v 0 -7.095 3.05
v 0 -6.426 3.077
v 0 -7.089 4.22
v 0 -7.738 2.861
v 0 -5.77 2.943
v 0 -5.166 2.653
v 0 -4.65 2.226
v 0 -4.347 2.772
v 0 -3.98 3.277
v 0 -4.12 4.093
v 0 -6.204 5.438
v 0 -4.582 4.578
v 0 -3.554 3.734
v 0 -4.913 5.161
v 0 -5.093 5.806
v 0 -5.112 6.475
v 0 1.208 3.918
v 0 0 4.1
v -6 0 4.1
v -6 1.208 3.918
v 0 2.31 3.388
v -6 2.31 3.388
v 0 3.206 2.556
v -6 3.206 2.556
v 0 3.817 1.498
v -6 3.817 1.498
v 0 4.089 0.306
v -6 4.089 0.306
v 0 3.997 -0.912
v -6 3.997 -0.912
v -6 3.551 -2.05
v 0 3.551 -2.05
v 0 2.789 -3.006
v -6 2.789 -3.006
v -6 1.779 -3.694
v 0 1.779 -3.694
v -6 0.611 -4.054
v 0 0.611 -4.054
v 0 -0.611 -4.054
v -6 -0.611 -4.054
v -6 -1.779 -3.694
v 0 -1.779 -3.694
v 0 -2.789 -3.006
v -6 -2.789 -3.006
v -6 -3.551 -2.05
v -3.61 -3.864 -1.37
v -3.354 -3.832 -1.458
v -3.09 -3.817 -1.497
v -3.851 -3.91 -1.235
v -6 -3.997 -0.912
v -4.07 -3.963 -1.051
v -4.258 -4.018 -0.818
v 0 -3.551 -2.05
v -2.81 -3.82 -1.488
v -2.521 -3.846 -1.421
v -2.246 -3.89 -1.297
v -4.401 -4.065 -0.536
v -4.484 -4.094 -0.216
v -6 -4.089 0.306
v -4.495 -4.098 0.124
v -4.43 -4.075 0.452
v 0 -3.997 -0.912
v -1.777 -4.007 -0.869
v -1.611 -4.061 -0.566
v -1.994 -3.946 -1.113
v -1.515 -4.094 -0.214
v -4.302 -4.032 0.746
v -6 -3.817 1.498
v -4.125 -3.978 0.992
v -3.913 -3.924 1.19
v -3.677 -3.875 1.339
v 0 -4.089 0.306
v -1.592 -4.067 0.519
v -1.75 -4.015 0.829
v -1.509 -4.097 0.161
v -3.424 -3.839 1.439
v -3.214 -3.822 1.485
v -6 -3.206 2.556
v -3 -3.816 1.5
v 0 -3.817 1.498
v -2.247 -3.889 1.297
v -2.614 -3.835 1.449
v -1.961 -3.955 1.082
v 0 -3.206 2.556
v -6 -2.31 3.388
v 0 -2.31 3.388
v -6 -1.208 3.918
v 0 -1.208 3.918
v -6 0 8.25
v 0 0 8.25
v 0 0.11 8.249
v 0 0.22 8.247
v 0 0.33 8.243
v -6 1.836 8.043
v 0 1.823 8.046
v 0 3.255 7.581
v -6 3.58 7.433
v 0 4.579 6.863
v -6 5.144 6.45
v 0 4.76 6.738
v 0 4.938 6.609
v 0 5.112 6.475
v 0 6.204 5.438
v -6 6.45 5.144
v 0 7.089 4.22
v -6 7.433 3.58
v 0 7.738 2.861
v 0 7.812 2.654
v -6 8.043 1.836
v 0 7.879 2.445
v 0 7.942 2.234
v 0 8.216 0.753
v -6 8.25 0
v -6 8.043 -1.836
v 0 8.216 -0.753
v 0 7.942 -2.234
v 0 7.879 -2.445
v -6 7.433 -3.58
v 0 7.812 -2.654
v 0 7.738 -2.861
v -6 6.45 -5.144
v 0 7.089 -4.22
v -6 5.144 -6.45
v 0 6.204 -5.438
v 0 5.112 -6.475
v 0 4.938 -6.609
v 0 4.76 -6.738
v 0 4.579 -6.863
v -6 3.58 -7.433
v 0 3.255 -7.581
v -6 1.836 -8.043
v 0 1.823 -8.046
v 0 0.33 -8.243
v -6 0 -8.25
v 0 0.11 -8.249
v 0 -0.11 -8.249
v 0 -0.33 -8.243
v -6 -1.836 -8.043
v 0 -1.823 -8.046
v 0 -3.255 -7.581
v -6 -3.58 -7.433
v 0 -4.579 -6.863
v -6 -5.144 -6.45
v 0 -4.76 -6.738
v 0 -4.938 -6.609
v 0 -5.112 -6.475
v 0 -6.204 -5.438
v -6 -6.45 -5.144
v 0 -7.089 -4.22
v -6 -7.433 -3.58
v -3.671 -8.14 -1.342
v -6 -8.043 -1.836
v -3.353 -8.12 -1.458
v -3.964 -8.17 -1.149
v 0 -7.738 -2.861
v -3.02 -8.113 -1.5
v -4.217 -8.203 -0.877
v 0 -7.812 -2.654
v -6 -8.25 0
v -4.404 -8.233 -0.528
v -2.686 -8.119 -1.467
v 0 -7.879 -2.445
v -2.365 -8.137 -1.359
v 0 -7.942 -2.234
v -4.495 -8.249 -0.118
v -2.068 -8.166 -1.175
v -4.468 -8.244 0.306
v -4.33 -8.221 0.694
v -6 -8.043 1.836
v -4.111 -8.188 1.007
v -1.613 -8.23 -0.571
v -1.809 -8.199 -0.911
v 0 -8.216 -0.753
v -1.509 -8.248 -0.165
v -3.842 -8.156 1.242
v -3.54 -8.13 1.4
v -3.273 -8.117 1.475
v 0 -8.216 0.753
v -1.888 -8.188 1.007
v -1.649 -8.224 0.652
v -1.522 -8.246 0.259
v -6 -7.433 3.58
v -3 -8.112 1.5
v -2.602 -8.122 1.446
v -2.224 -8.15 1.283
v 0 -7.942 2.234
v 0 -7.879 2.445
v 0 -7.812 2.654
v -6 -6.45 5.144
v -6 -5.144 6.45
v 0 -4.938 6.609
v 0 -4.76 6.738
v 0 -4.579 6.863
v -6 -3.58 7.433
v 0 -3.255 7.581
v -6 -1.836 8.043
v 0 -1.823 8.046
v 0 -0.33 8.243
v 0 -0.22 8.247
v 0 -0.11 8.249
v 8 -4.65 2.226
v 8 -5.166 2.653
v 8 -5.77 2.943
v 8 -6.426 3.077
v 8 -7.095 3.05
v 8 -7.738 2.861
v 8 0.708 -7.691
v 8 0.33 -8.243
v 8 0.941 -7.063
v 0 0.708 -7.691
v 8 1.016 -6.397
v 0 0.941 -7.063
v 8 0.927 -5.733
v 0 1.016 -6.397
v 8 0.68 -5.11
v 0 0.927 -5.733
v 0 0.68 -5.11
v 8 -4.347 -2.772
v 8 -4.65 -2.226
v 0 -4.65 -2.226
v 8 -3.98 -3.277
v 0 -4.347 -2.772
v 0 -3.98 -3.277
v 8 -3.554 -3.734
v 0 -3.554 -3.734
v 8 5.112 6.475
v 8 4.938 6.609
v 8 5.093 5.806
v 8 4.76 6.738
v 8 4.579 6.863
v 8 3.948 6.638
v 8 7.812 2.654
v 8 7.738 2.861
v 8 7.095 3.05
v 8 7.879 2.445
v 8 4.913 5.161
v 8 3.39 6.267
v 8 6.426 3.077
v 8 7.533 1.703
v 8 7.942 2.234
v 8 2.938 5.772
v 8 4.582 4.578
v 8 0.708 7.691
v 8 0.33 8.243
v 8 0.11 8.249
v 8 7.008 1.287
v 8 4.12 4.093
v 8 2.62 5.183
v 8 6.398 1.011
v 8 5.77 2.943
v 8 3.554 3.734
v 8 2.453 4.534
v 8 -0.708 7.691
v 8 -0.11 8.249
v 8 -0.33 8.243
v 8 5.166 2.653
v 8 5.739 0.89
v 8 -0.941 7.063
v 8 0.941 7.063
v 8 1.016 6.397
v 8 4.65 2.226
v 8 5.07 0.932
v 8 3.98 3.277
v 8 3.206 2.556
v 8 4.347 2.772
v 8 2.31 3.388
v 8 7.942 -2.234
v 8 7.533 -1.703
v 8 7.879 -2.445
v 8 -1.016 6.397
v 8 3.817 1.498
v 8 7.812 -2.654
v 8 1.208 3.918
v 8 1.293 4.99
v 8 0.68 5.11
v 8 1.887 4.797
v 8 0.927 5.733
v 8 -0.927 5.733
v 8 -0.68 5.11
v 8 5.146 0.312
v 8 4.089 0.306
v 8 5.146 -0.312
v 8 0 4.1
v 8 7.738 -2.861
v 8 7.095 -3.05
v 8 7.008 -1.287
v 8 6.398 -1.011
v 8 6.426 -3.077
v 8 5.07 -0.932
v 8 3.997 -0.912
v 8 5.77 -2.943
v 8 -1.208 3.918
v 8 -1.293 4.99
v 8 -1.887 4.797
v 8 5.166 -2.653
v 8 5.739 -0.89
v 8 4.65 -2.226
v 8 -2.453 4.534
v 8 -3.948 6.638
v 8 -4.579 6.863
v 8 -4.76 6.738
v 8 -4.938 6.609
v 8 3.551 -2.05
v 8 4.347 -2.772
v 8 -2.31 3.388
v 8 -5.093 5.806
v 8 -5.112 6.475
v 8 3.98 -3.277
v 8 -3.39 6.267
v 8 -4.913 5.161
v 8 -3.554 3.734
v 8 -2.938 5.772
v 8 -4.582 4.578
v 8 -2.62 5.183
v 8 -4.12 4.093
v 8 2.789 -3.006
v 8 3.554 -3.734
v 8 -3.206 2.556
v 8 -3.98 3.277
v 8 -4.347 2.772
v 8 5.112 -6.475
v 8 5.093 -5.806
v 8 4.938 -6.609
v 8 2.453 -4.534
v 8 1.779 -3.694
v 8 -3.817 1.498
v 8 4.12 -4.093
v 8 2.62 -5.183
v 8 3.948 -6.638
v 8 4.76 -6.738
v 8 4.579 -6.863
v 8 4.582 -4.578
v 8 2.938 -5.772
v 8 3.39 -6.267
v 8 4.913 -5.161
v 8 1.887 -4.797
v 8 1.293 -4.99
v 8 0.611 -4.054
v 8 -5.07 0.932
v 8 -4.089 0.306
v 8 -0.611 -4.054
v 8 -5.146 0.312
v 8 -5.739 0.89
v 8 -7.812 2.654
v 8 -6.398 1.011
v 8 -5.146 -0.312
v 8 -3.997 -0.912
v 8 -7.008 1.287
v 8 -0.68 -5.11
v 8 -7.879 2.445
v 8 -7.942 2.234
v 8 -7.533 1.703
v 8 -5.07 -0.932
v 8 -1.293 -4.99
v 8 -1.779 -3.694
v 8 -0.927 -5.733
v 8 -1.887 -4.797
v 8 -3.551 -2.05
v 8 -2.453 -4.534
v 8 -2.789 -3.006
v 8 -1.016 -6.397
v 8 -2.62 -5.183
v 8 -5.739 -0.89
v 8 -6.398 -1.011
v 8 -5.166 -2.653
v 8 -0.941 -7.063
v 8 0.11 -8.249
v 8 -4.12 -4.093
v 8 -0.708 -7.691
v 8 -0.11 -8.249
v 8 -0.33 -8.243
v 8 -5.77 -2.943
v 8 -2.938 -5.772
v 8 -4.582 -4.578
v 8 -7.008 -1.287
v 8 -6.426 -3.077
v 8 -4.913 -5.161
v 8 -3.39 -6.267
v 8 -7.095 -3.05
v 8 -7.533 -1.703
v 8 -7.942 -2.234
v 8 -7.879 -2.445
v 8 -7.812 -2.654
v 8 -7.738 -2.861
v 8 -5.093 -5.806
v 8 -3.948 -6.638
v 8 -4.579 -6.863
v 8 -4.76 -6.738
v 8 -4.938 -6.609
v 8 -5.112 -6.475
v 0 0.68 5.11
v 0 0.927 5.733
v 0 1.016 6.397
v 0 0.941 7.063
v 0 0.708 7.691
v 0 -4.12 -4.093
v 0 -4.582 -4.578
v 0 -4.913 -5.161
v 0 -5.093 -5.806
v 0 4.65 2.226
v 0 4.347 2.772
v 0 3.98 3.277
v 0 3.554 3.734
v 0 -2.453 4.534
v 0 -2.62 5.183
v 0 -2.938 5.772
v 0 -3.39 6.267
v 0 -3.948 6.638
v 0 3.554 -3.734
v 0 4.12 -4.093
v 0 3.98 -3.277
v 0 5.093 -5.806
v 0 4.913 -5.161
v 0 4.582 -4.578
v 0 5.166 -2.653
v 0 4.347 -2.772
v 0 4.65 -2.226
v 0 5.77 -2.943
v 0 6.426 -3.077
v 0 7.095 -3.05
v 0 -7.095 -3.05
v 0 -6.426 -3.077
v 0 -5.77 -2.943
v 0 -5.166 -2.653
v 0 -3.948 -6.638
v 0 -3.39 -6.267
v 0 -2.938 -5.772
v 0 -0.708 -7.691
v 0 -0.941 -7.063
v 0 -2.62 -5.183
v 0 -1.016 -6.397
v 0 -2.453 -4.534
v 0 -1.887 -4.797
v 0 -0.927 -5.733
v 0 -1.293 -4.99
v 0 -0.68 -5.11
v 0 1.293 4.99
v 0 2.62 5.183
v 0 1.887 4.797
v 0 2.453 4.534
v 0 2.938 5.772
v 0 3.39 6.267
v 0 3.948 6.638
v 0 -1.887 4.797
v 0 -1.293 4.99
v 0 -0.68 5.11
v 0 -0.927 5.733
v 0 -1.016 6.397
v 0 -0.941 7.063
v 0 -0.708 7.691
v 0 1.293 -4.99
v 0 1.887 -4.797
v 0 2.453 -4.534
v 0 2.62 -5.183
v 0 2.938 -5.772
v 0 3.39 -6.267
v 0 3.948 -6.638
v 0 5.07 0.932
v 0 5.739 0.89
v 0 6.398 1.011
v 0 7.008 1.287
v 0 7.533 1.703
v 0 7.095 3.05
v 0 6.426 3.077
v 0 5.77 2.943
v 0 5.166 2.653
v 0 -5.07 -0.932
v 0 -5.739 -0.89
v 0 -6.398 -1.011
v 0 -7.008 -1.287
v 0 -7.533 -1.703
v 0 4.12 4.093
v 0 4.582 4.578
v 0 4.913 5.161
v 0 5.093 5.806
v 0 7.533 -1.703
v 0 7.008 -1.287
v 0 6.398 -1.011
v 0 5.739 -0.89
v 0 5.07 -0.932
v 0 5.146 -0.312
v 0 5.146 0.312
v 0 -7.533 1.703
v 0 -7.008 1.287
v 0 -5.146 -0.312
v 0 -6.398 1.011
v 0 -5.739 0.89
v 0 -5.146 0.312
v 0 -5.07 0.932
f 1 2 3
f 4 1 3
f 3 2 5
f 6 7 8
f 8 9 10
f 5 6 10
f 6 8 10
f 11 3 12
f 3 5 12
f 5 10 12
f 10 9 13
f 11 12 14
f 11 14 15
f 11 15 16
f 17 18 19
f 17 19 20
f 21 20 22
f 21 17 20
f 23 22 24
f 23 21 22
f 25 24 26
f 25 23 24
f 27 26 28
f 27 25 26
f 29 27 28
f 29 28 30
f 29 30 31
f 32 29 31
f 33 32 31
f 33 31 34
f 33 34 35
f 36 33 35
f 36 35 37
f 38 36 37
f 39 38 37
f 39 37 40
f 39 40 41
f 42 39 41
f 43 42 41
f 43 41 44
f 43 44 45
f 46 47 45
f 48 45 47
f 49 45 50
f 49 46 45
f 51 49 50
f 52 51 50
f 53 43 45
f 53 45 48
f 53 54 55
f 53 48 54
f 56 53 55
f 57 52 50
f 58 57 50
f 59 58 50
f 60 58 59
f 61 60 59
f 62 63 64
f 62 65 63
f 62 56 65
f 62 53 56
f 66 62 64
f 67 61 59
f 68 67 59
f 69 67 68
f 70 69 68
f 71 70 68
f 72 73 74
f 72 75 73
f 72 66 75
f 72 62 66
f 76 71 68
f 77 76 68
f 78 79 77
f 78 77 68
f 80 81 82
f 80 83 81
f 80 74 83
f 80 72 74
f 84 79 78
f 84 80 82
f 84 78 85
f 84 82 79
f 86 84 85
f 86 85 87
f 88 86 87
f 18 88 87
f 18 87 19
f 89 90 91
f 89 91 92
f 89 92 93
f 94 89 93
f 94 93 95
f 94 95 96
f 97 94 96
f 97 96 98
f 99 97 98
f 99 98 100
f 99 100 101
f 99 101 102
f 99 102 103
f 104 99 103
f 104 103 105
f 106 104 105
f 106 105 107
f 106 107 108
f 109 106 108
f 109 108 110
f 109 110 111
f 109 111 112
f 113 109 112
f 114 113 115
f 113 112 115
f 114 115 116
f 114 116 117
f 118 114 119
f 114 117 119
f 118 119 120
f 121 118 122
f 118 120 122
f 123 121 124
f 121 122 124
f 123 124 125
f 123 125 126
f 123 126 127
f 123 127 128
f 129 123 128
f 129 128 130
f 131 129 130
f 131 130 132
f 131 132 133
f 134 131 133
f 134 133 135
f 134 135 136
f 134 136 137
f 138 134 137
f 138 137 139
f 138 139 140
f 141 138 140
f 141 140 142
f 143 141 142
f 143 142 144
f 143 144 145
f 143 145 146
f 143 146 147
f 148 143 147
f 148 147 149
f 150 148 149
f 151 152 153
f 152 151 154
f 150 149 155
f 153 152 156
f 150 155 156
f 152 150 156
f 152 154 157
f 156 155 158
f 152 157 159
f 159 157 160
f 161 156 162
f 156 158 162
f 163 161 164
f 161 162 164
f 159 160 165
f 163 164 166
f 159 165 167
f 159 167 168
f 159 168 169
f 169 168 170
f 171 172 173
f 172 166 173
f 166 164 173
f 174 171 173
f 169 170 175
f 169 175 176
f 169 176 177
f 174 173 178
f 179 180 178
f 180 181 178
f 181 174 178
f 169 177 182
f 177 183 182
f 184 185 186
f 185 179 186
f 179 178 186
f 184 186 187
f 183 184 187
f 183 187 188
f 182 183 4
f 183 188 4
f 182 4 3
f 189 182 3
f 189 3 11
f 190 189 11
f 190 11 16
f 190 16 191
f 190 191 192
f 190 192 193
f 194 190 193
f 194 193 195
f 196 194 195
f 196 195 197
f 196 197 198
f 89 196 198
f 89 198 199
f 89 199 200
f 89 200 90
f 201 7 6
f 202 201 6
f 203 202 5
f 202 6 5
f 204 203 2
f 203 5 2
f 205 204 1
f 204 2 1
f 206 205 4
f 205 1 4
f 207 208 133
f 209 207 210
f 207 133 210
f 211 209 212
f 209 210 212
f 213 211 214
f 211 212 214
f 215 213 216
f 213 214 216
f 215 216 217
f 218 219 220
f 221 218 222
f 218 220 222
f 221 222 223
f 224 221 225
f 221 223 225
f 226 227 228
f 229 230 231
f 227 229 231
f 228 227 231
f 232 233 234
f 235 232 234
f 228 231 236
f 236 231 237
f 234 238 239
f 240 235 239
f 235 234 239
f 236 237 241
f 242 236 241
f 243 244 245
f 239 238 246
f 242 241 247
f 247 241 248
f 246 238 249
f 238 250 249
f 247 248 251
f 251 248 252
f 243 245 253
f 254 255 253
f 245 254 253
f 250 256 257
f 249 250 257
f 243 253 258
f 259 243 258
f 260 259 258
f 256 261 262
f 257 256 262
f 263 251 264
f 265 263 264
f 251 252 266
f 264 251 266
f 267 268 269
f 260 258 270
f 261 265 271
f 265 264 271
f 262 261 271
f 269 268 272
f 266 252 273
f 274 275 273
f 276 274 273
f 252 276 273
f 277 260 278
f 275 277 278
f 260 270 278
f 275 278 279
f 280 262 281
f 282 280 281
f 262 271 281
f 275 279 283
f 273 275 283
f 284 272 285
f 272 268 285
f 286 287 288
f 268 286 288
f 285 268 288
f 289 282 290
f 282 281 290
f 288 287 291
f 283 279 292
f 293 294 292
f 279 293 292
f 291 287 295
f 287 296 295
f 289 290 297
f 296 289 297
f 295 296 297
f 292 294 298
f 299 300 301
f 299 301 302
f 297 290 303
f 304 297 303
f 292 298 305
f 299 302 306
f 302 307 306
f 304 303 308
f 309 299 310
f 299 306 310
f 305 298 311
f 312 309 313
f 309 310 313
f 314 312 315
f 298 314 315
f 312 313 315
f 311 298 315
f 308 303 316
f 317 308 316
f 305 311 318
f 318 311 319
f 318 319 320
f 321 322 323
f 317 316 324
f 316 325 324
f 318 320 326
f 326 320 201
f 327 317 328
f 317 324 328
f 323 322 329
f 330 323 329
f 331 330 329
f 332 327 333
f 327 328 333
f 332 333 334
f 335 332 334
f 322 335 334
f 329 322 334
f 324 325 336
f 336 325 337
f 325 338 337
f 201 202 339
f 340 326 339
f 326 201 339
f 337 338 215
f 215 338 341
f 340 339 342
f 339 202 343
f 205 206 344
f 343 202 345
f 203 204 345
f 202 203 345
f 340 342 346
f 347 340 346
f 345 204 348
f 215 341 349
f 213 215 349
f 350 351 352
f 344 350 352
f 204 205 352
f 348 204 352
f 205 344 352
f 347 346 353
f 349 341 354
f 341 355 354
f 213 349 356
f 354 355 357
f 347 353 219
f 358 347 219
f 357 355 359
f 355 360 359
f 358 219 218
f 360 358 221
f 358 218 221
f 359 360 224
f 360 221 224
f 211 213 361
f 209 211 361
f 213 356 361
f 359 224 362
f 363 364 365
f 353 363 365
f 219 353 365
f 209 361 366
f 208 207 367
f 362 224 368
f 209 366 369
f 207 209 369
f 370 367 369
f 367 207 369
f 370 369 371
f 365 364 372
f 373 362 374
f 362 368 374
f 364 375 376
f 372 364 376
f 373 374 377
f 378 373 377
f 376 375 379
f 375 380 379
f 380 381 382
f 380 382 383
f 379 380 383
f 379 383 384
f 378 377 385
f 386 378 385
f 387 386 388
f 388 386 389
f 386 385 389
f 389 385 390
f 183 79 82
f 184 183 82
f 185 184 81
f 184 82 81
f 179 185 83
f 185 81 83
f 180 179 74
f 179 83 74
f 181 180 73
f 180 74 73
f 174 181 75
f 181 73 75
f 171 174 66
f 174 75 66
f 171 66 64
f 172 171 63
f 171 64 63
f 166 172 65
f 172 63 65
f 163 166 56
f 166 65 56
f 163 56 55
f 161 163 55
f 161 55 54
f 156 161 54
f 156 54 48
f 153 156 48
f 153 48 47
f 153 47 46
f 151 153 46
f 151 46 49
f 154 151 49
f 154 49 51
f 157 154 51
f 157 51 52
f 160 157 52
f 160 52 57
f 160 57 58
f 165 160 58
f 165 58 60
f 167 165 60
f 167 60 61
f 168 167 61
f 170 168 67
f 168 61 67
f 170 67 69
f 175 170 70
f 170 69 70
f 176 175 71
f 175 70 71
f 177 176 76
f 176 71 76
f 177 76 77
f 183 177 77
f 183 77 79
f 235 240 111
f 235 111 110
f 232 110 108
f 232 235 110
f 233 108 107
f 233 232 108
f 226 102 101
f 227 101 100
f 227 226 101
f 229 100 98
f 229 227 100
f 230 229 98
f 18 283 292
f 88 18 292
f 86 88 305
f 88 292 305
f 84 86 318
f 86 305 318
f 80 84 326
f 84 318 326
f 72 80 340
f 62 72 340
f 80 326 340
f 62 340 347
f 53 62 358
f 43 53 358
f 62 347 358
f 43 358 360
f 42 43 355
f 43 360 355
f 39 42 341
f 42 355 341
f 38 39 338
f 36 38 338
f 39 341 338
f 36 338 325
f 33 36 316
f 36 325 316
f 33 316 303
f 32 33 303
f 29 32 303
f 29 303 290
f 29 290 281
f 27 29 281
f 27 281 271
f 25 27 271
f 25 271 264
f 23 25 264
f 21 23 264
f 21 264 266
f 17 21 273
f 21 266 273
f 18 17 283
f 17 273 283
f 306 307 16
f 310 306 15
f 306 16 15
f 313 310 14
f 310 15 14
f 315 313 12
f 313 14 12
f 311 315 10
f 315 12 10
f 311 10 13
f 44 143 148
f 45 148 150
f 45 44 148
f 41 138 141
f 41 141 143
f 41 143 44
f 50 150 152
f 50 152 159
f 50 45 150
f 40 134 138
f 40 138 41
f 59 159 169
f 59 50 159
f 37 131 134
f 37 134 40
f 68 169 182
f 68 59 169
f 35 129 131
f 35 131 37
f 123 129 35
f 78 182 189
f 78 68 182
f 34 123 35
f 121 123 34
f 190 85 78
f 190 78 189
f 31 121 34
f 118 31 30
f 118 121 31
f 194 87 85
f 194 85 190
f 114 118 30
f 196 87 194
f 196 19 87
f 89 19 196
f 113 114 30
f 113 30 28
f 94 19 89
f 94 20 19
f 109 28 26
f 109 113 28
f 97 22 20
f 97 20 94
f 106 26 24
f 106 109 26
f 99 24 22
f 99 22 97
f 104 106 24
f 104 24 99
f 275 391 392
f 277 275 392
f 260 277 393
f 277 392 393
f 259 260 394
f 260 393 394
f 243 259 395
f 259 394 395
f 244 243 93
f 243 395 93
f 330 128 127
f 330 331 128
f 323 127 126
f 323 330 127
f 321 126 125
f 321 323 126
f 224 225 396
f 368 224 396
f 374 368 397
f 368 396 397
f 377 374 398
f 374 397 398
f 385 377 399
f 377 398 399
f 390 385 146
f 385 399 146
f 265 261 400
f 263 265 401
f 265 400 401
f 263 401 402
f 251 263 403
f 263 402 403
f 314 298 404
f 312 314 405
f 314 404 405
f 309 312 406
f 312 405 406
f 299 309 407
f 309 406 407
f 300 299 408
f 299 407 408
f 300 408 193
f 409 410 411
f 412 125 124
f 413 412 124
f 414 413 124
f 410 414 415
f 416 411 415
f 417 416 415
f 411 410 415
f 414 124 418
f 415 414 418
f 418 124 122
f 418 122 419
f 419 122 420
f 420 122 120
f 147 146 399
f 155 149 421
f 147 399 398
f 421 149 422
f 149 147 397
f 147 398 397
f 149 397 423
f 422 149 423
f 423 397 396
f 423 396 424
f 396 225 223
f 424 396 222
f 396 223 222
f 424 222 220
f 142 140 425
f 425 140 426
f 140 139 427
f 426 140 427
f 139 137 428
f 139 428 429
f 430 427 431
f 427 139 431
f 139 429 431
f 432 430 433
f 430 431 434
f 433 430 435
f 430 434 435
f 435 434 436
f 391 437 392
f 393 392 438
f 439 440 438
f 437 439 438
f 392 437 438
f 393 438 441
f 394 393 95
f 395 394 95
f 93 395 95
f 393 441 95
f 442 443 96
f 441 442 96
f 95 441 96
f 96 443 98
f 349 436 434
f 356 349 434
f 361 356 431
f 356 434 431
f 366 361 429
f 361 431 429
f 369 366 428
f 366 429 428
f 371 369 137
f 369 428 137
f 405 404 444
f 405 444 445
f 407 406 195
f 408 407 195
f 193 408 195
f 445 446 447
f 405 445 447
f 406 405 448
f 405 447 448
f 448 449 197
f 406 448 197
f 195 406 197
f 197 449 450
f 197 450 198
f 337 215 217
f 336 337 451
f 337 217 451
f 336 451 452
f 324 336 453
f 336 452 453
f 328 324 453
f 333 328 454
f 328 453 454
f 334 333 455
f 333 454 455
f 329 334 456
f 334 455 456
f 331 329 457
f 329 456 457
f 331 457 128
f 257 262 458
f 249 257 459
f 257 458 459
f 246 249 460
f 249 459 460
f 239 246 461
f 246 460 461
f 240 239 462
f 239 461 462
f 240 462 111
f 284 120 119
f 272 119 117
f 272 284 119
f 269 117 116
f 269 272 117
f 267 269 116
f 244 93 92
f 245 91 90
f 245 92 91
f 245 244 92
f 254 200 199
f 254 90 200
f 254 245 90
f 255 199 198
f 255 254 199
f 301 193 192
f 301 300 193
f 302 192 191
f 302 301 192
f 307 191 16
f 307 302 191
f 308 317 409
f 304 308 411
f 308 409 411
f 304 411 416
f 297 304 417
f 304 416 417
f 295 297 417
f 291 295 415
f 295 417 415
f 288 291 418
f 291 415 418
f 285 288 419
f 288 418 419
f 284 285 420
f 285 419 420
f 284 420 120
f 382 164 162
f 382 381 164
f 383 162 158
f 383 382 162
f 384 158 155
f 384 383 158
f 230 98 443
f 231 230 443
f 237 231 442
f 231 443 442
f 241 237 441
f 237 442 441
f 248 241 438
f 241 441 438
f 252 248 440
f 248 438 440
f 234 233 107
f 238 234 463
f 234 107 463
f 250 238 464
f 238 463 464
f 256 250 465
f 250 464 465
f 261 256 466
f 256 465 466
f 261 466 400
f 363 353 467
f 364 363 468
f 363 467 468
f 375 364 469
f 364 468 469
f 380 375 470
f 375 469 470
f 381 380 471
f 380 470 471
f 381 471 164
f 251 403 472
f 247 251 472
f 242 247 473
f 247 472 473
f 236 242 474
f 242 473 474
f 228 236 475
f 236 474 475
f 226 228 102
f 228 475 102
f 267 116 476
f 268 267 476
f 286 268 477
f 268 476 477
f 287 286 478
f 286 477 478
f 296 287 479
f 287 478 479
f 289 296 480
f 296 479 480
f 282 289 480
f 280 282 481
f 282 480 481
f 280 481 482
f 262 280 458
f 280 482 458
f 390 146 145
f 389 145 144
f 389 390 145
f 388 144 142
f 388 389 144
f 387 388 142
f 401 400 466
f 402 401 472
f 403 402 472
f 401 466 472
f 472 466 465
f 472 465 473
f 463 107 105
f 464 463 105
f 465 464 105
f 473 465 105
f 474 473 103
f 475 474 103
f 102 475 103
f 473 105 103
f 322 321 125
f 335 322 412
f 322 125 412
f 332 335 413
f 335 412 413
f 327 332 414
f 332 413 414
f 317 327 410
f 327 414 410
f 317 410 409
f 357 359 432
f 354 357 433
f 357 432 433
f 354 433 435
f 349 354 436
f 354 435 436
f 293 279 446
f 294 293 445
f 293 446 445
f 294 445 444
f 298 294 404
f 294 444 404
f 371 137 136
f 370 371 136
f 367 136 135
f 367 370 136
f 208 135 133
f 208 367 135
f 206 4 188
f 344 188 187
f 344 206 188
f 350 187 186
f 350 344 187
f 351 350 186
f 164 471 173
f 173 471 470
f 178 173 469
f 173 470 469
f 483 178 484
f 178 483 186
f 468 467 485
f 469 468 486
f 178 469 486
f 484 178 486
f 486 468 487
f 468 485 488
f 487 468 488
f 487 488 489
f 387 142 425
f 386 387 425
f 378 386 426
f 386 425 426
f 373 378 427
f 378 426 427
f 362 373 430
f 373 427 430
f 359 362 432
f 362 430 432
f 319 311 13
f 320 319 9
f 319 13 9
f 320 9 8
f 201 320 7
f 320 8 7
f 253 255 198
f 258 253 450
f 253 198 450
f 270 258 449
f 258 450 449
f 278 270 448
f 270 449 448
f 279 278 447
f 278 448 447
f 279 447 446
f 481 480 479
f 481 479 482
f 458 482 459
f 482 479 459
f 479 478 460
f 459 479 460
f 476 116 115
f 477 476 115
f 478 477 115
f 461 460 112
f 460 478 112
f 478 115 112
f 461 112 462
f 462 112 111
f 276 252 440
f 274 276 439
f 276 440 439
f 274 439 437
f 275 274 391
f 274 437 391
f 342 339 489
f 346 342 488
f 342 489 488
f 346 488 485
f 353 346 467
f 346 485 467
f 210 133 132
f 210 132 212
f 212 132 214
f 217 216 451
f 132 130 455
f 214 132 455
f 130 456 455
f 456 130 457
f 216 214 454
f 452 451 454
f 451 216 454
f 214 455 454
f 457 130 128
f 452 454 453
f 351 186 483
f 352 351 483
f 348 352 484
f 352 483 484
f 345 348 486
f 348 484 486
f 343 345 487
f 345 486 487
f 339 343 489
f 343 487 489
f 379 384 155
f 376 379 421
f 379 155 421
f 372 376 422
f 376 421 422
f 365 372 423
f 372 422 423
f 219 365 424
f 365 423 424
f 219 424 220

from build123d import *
from build123d.topology import SkipClean

# Parameters (mm, degrees)
BASPROSKE_W         = 8
BASPROSKE_H         = 8.25
TOOTHCUT_DEPTH      = 15.146554351
TEETHCUTS_COUNT     = 10
TEETHCUTS_ANGLE     = 324
BORSKE_R            = 4.1
BORE_DEPTH          = 50.0000508
SKETCH_1_R          = 8.25
SKETCH_1_R_2        = 4.1
EXTRUDE_3_DEPTH     = 6
SKETCH_2_R          = 1.5
CUT_EXTRUDE_1_DEPTH = 16


with BuildPart() as part:
    # BasProSke → Base-Revolve (revolve)
    with BuildSketch(Plane(origin=(0, 0, 0), x_dir=(1, 0, 0), z_dir=(0, 1, 0))):
        with Locations((4, 4.125)):
            Rectangle(BASPROSKE_W, BASPROSKE_H)
    revolve(axis=Axis((-10, 0, 0), (1, 0, 0)))

    # TooCutSke → ToothCut (cut, through all)
    with BuildSketch(Plane(origin=(0, 0, 0), x_dir=(0, 0, -1), z_dir=(1, 0, 0))):
        with BuildLine():
            ThreePointArc((0.931992048, 5.070305058), (0, 5.15525), (-0.931992048, 5.070305058))
            ThreePointArc((-0.931992048, 5.070305058), (-1.137854344, 6.727189108), (-2.264257491, 7.959609486))
            ThreePointArc((-2.264257491, 7.959609486), (0, 8.2754), (2.264257491, 7.959609486))
            ThreePointArc((2.264257491, 7.959609486), (1.137854344, 6.727189108), (0.931992048, 5.070305058))
        make_face()
    toothcut = extrude(amount=TOOTHCUT_DEPTH, mode=Mode.SUBTRACT)

    # TeethCuts: ToothCut ×10 about axis
    teethcuts_axis = Axis((-10, 0, 0), (1, 0, 0))
    for i in range(1, TEETHCUTS_COUNT):
        add(toothcut.rotate(teethcuts_axis, i * TEETHCUTS_ANGLE / (TEETHCUTS_COUNT - 1)), mode=Mode.SUBTRACT)

    # BorSke → Bore (cut, symmetric)
    with BuildSketch(Plane(origin=(0, 0, 0), x_dir=(0, 0, -1), z_dir=(1, 0, 0))):
        Circle(BORSKE_R)
    extrude(amount=BORE_DEPTH, both=True, mode=Mode.SUBTRACT)

    # 草图1 → 凸台-拉伸3 (add)
    with SkipClean():  # the faces are left unmerged after this step: merging them gives an invalid solid
        with BuildSketch(Plane.ZY):
            Circle(SKETCH_1_R)
            Circle(SKETCH_1_R_2, mode=Mode.SUBTRACT)
        extrude(amount=EXTRUDE_3_DEPTH)
    add(part.part.scale(1), mode=Mode.REPLACE)  # the faces are merged on a copy

    # 草图2 → 切除-拉伸1 (cut)
    with BuildSketch(Plane(origin=(0, 0, 0), x_dir=(1, 0, 0), z_dir=(0, 1, 0))):
        with Locations((-3, 0)):
            Circle(SKETCH_2_R)
    extrude(amount=-CUT_EXTRUDE_1_DEPTH, mode=Mode.SUBTRACT)


solid = part.part
